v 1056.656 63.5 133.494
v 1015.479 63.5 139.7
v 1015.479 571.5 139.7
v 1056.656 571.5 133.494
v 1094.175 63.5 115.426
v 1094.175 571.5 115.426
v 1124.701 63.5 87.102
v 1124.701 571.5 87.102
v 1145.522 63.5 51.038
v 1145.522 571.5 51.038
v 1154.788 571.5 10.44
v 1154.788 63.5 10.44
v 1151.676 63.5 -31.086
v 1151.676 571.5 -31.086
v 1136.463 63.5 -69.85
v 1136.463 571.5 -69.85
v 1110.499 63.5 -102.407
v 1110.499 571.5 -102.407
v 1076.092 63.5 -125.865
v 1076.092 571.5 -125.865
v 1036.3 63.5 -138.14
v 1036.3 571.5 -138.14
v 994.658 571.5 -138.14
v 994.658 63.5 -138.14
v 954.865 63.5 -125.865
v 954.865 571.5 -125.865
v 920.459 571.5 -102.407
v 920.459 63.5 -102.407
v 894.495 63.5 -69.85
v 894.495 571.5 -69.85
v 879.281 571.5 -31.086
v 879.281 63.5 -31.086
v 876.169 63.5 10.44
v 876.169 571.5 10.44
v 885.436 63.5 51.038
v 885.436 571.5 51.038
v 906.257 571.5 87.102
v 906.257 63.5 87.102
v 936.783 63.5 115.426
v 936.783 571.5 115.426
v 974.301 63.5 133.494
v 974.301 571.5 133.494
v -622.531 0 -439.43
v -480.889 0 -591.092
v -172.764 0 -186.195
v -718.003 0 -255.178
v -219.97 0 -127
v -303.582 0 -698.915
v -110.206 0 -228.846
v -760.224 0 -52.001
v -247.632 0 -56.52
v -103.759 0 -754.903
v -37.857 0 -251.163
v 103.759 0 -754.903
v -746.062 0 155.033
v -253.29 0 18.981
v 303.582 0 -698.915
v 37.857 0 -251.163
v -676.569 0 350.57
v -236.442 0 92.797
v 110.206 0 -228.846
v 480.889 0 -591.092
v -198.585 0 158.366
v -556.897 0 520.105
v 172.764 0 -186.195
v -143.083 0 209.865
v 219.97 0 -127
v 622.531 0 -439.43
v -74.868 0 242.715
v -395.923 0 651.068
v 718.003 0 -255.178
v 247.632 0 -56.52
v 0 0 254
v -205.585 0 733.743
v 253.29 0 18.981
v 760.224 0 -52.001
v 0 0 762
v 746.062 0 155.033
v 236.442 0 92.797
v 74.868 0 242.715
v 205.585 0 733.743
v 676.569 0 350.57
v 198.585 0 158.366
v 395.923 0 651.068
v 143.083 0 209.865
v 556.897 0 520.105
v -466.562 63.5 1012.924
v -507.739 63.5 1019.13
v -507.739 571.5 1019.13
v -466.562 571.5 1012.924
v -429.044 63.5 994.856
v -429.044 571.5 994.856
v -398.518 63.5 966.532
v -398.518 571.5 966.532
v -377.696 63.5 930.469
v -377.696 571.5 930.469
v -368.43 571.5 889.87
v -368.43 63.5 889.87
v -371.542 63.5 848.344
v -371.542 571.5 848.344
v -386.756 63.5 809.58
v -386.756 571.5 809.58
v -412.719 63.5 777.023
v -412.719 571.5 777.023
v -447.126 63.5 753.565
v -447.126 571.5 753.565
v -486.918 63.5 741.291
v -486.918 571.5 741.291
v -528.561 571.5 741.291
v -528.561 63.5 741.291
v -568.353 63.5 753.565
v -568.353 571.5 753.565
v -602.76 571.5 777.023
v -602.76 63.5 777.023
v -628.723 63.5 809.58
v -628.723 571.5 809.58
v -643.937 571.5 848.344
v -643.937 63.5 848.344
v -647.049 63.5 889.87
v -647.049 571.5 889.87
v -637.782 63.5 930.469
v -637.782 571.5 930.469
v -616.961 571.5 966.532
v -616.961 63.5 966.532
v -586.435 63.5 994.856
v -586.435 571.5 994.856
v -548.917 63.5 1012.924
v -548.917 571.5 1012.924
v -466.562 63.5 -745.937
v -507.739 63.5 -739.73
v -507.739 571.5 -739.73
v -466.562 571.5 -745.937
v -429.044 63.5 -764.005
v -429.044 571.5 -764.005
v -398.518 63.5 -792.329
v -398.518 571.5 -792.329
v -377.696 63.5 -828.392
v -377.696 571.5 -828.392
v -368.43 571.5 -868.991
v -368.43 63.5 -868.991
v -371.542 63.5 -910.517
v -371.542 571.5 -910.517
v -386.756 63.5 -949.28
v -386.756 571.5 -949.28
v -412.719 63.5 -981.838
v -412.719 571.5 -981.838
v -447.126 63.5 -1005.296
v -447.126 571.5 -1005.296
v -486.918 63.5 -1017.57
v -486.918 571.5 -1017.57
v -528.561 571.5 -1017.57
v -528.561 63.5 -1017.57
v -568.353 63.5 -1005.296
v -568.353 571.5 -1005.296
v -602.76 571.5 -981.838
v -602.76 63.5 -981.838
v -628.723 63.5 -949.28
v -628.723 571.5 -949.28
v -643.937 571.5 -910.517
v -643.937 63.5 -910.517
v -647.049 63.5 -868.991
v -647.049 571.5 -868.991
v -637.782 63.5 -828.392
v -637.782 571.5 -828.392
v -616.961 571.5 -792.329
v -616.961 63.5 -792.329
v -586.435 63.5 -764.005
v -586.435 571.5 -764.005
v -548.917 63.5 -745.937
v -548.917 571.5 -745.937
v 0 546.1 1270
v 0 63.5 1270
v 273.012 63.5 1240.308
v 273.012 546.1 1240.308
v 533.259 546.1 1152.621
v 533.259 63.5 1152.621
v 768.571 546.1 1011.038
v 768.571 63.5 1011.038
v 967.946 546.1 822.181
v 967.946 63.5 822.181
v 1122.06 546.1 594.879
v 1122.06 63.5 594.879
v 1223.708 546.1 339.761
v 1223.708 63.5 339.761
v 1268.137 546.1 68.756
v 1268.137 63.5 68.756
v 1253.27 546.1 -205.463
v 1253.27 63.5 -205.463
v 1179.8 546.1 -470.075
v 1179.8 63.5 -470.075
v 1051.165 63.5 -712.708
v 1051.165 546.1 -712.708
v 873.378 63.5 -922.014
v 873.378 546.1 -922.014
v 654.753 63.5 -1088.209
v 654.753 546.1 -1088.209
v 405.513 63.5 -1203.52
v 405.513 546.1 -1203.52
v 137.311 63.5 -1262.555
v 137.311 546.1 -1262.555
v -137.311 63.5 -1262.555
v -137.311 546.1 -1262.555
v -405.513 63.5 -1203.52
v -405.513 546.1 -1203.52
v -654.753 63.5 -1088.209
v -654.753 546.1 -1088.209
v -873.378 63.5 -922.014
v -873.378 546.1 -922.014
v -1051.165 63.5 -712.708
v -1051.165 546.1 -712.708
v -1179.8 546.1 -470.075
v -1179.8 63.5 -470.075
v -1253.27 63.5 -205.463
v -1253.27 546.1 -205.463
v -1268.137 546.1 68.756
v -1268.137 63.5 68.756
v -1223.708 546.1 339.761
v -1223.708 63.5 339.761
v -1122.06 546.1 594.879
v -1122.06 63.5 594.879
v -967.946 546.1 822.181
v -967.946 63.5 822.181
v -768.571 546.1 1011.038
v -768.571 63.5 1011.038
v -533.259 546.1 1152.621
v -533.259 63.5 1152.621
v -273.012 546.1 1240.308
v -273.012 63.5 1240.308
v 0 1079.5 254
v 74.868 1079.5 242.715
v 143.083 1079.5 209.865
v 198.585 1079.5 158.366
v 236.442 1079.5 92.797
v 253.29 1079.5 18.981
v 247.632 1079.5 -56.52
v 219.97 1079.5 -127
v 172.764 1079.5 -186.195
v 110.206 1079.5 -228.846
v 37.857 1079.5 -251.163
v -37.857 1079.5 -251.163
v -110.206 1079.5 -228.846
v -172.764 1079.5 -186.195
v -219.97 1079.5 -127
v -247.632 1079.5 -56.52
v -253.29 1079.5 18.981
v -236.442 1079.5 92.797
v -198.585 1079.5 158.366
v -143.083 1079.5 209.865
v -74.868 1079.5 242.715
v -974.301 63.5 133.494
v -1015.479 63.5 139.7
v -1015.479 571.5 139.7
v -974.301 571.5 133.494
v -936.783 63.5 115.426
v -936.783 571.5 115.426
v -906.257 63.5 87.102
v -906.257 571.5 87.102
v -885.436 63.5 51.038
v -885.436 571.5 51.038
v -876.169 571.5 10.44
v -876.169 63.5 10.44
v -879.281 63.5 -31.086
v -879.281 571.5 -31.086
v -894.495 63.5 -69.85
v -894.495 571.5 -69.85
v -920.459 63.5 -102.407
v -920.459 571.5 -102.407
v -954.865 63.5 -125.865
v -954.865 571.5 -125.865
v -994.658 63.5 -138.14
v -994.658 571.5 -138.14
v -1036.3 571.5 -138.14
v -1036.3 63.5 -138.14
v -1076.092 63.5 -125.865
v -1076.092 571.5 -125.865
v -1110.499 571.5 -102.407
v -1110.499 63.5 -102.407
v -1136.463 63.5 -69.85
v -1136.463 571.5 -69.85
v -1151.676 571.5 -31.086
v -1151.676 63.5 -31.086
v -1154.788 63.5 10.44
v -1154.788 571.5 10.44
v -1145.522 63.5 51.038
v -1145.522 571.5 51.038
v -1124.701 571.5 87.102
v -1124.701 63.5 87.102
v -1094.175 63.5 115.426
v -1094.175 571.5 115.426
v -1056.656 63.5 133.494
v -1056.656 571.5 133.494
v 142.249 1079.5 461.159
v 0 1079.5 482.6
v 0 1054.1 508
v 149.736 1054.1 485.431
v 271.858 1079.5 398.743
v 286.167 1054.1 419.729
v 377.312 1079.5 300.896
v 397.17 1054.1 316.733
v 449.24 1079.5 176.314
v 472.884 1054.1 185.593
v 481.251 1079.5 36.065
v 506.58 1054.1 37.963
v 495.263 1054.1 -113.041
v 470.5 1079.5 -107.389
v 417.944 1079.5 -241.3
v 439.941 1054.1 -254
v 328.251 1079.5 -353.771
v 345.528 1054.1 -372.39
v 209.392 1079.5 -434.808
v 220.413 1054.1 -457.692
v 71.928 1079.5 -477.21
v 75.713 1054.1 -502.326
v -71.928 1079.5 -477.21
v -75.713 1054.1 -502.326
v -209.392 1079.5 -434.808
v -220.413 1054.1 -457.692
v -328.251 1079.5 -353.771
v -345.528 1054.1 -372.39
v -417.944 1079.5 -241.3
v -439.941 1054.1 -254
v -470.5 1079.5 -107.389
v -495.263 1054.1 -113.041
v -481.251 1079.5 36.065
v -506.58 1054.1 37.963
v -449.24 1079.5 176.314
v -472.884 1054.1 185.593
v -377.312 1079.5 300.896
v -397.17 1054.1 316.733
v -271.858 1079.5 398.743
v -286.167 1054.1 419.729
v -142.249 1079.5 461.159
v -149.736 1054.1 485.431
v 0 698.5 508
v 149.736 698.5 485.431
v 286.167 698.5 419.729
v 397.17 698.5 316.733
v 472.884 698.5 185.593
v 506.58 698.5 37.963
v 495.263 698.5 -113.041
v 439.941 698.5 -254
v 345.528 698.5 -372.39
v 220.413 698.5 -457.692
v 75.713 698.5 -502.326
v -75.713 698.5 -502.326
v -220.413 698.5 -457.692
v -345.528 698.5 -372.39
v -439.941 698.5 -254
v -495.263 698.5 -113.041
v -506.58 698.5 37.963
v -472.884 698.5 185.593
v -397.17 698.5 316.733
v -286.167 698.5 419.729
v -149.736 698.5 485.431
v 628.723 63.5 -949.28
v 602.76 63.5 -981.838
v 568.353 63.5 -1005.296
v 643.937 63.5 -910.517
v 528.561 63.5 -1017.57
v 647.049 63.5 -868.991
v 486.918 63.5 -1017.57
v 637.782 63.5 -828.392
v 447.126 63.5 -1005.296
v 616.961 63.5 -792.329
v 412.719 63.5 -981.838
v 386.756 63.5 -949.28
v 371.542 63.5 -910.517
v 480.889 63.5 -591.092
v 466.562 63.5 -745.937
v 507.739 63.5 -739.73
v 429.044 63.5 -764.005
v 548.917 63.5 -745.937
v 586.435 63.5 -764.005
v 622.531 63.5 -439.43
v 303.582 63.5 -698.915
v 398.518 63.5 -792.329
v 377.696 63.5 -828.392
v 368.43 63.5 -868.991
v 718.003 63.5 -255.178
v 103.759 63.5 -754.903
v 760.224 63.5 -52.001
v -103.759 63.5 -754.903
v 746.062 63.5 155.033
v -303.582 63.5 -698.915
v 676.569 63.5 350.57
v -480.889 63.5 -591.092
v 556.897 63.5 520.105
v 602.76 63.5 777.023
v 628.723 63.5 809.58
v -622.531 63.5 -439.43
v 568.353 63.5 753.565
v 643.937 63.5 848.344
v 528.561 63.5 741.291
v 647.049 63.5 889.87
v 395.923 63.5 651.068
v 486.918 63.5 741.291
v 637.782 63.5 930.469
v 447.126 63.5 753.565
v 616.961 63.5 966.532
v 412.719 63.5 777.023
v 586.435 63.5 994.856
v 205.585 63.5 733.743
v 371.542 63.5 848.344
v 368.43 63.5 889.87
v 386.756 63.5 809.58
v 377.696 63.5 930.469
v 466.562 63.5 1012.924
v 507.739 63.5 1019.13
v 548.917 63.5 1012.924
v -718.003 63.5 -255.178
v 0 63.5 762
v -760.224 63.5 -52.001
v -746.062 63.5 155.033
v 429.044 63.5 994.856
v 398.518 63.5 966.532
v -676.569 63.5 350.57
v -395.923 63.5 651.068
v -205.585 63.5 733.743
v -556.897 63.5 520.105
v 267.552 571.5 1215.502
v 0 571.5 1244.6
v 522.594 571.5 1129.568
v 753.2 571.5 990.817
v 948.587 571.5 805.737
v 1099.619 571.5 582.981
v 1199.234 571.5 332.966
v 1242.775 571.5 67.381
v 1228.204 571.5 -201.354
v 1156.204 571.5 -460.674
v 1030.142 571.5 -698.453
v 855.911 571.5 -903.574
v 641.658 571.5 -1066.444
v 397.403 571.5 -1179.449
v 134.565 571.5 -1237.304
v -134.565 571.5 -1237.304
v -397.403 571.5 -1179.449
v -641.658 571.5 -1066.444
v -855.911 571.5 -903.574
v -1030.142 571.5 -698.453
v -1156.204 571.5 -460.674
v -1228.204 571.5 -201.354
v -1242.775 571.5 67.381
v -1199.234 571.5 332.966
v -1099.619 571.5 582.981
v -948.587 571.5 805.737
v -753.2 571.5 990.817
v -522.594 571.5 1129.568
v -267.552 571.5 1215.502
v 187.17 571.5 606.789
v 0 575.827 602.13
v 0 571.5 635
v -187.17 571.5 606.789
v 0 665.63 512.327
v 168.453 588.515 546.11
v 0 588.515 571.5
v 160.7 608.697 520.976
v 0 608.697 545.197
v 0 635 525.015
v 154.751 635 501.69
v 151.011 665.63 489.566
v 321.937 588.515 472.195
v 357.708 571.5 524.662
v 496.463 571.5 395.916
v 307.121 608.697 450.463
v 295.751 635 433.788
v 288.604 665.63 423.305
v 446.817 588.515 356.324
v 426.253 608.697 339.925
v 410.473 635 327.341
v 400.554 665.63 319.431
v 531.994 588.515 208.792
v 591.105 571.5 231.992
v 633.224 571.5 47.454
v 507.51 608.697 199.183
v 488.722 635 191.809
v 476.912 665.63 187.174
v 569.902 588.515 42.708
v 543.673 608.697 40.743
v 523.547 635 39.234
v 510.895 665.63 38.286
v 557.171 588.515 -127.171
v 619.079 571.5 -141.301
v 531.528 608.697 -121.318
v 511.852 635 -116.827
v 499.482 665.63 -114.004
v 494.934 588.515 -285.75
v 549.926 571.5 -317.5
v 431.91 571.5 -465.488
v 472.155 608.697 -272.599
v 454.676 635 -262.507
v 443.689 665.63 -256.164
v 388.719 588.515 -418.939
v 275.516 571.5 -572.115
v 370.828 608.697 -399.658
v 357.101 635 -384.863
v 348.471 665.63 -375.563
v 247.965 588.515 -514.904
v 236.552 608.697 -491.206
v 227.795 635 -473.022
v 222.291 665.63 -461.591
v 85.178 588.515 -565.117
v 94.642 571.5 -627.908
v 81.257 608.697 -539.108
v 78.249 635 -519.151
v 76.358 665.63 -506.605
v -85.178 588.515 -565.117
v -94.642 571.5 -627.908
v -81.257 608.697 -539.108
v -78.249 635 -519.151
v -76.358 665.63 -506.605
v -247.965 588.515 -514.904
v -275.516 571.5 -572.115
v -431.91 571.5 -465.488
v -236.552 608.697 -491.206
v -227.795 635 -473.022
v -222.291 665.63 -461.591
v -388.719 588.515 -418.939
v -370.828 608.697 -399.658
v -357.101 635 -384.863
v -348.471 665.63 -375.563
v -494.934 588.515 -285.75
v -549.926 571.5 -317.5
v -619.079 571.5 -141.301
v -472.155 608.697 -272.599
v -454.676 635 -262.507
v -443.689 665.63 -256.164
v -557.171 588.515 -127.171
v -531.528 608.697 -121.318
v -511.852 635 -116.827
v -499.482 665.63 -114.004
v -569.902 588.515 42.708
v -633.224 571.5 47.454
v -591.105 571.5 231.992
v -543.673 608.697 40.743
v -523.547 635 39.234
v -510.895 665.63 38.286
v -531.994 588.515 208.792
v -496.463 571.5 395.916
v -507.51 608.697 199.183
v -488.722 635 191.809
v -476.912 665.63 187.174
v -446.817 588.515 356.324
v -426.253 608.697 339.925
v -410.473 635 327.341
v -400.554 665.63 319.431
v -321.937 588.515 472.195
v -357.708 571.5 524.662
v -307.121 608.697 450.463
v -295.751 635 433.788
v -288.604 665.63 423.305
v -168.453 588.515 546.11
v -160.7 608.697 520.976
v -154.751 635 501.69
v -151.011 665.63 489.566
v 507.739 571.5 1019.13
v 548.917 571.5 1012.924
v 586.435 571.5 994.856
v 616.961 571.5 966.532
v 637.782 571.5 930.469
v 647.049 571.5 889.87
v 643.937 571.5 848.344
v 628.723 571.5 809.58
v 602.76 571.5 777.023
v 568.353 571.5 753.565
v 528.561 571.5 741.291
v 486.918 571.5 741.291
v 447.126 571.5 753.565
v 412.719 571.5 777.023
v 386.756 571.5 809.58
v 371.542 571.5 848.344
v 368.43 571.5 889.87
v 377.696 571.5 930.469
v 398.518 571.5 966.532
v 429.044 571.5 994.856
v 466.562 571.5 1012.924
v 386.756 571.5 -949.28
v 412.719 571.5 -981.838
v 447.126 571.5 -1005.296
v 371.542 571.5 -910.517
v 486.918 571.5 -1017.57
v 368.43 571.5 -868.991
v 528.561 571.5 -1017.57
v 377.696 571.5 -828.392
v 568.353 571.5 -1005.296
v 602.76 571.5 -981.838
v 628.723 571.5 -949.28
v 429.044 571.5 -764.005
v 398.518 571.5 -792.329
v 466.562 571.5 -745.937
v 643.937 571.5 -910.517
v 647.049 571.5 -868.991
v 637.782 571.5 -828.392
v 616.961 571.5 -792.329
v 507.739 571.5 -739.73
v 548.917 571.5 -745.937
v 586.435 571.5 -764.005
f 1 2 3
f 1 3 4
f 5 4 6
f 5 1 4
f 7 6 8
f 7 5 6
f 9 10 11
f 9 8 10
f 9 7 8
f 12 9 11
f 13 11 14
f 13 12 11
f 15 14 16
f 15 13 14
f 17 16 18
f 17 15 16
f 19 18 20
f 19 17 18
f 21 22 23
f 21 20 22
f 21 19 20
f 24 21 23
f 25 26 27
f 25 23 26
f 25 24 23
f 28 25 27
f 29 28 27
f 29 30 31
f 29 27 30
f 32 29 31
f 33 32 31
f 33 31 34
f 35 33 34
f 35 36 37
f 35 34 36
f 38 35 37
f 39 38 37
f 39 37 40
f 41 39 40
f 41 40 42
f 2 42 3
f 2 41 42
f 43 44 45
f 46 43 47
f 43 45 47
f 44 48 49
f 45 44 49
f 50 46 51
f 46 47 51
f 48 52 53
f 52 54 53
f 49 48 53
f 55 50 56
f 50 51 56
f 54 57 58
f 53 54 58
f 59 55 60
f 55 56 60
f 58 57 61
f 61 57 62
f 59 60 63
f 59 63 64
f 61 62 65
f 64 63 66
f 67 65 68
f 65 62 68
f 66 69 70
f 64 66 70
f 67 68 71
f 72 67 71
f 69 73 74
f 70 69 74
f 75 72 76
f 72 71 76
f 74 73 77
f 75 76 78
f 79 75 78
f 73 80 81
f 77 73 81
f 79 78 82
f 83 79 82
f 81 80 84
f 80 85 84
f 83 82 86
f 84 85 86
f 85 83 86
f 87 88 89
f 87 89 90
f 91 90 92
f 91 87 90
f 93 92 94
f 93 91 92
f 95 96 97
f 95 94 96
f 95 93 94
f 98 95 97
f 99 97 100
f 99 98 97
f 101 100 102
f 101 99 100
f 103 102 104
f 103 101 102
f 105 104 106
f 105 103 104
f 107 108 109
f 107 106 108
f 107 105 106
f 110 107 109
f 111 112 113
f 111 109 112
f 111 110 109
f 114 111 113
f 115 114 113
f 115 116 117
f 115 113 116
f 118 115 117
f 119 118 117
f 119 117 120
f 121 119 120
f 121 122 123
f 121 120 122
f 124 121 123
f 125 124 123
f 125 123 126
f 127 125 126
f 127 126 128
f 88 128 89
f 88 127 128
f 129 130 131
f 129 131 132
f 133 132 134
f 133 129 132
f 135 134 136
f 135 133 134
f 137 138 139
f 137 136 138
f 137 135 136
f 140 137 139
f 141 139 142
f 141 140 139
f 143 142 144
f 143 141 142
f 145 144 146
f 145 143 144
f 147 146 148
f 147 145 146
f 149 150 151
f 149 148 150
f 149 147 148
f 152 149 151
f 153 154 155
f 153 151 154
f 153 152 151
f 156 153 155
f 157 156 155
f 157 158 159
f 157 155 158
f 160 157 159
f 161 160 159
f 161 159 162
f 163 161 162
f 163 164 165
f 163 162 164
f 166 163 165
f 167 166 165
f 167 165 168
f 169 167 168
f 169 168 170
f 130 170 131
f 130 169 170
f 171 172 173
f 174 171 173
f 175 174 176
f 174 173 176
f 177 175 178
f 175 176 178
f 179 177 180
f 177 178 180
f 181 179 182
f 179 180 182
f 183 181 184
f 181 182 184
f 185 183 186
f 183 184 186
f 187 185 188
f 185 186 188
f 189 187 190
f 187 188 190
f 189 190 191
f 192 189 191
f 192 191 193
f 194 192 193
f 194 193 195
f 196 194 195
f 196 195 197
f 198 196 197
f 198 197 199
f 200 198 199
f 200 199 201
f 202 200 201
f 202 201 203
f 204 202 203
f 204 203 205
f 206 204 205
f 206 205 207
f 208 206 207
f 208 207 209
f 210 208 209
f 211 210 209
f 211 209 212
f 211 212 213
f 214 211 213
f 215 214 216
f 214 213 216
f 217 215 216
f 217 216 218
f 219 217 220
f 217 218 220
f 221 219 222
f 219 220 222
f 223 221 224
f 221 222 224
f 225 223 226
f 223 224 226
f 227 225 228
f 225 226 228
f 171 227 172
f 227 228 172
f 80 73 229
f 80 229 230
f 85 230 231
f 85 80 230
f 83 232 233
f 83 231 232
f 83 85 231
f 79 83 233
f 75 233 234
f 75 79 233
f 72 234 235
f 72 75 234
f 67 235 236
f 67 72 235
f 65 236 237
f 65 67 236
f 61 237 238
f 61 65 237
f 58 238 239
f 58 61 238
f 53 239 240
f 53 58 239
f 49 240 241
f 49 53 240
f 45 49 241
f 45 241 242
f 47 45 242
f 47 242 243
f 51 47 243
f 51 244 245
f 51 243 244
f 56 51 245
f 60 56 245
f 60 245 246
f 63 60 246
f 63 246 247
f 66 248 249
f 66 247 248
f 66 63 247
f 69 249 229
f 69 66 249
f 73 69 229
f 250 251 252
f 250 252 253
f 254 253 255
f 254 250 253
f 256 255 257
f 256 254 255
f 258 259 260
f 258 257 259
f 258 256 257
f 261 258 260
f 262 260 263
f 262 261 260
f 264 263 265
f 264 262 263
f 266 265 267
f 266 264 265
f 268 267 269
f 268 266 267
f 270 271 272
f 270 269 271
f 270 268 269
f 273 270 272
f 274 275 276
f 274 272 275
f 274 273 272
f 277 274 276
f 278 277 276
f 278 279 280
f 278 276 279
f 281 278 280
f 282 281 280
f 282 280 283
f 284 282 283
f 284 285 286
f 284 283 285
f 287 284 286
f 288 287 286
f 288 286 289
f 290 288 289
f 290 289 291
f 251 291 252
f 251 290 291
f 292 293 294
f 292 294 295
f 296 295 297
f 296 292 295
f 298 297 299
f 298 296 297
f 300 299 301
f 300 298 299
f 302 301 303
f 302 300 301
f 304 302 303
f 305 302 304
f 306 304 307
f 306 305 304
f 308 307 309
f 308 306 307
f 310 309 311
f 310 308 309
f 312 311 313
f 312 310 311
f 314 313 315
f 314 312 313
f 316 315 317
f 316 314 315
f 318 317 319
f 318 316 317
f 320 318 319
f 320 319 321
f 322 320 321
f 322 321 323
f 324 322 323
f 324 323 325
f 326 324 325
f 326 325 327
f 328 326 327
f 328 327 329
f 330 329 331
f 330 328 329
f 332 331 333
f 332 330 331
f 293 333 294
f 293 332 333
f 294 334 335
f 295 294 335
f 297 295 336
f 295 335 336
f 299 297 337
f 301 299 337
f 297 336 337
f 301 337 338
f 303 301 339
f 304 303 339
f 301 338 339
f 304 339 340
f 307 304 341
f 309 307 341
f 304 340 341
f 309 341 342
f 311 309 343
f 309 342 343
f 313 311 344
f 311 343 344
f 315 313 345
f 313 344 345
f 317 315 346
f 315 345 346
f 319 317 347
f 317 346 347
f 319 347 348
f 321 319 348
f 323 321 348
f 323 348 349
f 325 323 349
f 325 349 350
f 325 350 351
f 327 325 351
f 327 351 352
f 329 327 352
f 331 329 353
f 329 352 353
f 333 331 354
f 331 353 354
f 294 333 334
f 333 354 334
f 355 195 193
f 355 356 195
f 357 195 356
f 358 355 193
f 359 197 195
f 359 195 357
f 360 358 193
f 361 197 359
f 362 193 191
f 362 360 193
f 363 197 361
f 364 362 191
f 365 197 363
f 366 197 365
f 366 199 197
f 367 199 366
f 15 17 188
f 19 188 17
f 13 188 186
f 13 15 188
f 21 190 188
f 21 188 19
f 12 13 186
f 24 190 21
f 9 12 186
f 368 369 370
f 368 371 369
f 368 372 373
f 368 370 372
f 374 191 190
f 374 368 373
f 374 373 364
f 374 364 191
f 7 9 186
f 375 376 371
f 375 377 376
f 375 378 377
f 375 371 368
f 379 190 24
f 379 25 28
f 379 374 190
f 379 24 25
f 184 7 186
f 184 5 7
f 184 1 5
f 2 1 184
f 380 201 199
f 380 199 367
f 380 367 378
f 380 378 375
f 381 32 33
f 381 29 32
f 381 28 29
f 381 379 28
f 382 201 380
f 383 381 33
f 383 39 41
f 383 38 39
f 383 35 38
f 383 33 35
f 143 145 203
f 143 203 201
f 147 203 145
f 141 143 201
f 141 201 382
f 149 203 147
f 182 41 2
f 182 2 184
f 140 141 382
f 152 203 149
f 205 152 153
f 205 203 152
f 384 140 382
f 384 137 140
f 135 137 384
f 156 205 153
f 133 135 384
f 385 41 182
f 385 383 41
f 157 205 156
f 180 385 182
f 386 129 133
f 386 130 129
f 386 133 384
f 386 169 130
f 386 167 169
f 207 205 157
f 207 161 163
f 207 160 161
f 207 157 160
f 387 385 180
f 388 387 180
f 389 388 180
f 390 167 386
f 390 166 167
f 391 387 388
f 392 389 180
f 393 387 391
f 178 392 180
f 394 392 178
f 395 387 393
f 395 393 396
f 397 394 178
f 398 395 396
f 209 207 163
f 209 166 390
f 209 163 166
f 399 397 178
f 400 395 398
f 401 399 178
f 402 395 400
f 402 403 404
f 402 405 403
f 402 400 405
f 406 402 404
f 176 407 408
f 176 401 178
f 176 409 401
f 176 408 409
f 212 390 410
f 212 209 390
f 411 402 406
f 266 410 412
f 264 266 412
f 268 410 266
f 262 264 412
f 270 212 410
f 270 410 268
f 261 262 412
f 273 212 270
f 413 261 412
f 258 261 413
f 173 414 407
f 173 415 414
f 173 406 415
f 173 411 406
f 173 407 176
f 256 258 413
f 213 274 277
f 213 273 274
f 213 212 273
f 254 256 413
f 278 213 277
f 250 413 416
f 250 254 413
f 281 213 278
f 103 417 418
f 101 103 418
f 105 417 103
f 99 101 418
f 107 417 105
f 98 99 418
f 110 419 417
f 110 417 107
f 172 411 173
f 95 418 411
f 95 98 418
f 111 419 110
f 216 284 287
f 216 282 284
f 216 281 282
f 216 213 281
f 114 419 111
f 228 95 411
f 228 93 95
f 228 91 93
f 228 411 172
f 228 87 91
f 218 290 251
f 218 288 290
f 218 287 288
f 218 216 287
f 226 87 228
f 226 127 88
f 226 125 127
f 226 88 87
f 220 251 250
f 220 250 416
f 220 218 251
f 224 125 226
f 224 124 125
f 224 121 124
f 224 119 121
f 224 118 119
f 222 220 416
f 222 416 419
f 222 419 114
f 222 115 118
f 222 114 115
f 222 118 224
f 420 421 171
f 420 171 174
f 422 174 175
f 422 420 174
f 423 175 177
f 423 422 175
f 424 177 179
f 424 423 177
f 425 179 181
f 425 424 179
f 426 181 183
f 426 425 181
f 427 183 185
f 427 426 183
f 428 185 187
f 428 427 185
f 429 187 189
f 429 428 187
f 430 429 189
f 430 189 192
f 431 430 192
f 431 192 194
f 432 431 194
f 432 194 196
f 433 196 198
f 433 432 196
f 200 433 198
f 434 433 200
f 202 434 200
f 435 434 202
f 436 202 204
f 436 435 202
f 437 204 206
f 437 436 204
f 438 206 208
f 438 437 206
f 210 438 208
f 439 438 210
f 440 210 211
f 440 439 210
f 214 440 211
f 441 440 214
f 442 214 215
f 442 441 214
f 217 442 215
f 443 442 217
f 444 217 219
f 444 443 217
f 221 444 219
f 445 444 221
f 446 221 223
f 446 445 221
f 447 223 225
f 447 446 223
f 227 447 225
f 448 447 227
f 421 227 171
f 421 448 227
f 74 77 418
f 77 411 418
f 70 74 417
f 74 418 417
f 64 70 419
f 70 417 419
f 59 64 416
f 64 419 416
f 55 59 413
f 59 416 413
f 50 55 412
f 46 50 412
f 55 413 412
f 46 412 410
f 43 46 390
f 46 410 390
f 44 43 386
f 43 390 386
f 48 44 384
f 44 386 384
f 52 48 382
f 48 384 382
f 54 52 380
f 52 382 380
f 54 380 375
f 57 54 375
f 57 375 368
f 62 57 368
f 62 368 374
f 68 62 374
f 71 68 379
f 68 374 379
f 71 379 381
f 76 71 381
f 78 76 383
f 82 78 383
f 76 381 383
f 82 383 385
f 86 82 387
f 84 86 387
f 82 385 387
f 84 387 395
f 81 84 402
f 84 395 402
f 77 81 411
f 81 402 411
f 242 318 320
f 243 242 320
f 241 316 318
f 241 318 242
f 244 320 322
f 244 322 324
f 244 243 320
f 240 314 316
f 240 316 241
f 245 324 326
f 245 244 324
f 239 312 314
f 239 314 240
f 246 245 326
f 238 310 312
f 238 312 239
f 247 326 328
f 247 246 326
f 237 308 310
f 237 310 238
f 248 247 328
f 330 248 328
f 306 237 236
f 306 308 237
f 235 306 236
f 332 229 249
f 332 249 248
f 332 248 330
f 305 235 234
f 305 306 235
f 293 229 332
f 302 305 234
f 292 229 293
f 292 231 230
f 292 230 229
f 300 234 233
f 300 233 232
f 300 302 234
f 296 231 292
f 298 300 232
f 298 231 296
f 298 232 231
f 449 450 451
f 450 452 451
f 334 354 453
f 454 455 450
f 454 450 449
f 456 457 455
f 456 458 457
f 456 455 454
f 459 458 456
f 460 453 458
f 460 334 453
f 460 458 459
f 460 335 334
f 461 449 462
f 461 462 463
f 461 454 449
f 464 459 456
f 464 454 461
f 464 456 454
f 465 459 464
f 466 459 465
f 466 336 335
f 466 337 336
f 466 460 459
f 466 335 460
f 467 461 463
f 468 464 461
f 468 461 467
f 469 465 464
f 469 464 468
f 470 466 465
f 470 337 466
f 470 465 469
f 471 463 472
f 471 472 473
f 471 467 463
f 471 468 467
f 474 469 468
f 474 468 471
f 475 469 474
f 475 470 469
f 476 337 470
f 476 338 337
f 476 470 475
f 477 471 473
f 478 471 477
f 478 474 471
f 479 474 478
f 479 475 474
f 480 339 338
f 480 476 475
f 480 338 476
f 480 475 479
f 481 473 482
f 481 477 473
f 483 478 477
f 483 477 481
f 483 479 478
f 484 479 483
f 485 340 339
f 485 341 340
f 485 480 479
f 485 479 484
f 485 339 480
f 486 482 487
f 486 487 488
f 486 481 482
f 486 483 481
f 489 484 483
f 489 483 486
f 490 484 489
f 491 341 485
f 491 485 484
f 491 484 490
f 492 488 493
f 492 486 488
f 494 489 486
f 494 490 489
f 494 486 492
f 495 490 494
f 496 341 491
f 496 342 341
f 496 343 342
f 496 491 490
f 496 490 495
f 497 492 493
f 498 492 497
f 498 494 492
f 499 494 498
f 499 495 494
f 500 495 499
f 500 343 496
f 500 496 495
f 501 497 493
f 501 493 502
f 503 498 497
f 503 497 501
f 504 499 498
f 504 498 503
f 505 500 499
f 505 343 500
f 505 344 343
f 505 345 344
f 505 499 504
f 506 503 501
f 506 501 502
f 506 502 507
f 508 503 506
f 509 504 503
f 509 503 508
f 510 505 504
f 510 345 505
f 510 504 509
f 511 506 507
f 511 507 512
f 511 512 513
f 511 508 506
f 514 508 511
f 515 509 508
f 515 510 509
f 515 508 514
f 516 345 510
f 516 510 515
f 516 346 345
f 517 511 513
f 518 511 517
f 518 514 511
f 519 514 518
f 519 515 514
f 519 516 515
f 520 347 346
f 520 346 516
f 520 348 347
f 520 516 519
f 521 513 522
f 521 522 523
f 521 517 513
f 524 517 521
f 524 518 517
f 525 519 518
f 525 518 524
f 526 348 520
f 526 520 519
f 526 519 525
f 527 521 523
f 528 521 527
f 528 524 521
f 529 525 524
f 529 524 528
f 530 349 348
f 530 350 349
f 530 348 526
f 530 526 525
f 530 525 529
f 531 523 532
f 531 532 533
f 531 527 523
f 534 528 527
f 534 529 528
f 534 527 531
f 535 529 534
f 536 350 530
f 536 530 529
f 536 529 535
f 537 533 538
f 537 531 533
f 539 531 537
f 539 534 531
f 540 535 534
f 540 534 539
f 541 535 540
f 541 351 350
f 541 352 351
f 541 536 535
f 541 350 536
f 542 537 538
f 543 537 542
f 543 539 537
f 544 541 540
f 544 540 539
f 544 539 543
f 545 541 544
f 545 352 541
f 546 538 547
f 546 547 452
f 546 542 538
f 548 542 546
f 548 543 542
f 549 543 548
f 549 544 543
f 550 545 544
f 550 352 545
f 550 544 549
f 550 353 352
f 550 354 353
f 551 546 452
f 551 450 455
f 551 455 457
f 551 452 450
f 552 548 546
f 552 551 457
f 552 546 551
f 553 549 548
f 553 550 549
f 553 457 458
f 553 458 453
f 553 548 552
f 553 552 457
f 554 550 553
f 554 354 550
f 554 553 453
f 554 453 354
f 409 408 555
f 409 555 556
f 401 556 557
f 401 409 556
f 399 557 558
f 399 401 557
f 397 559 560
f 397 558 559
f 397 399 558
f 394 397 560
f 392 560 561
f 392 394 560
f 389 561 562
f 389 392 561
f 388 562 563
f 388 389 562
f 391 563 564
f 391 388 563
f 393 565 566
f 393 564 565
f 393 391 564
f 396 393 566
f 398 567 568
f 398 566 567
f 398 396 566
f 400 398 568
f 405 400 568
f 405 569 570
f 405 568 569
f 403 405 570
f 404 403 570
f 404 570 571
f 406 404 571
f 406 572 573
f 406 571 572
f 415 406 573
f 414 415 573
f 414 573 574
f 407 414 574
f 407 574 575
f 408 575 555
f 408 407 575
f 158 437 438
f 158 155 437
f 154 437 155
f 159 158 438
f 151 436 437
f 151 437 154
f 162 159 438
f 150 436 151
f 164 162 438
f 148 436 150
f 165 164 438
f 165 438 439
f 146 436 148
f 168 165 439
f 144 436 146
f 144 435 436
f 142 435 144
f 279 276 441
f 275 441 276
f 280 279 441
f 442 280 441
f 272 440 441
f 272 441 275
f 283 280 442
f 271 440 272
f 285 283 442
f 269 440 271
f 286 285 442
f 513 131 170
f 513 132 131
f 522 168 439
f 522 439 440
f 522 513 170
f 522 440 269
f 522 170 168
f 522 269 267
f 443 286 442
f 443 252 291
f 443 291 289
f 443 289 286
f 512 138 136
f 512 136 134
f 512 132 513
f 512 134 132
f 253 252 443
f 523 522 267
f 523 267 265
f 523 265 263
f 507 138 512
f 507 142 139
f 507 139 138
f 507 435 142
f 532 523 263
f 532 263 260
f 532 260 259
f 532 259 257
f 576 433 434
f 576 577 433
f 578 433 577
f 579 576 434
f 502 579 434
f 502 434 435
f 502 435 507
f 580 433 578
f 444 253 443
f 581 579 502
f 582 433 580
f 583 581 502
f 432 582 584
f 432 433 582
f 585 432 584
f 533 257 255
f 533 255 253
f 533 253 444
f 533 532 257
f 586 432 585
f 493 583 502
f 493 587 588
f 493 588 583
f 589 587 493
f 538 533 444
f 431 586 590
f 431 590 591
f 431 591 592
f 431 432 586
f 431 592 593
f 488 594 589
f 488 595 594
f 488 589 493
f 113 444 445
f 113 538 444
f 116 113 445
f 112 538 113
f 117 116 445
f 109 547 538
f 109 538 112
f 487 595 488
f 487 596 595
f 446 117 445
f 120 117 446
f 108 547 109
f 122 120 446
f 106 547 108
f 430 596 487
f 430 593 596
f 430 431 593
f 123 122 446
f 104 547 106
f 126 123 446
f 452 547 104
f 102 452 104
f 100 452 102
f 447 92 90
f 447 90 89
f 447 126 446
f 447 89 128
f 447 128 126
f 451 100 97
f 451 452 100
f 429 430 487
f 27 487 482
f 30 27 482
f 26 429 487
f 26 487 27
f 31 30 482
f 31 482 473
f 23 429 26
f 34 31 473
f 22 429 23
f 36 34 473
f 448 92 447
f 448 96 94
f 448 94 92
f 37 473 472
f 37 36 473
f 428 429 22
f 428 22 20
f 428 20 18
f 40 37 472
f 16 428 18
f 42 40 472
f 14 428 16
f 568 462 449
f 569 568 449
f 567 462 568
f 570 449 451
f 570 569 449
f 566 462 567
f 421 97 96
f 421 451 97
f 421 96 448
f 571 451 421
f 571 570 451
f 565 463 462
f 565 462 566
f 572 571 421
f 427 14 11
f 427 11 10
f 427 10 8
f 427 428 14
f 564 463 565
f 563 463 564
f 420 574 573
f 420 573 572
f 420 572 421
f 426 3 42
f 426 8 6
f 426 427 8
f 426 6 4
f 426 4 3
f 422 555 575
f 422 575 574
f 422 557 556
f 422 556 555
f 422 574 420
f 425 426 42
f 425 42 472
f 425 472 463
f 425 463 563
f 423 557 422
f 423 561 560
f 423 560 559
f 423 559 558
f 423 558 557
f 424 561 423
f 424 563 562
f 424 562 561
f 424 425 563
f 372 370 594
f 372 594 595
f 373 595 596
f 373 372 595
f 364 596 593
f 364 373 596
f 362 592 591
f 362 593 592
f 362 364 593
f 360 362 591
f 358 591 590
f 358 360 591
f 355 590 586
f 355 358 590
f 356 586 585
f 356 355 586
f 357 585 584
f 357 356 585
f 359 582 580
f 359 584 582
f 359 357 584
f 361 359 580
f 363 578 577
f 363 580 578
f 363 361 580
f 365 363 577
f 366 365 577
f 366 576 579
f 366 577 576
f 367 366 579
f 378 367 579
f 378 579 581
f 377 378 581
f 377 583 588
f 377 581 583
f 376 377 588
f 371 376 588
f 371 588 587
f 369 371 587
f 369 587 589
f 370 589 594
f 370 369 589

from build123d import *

# Parameters (mm, degrees)
SKETCH_2_R               = 1270
EXTRUDE_1_DEPTH          = 571.5
SKETCH_3_W               = 508
SKETCH_3_H               = 63.5
CHAMFER_2_SIZE           = 25.4
SKETCH_4_R               = 139.7
CUT_EXTRUDE_1_DEPTH      = 1016
EXTRUDE_START            = -2.54
SKETCH_5_R               = 508
EXTRUDE_2_DEPTH          = 508
FILLET_10_R              = 127
CHAMFER_3_SIZE           = 25.4
CUT_EXTRUDE_2_DEPTH      = 1886.556130589
CUT_EXTRUDE_2_DEPTH_BACK = 1886.556130589
SKETCH_6_R               = 254


with BuildPart() as part:
    # 草图2 → 凸台-拉伸1 (new body)
    with BuildSketch(Plane(origin=(0, 0, 0), x_dir=(1, 0, 0), z_dir=(0, 1, 0))):
        with Locations(Location((0, 0, 0), (0, 0, 270))):
            Circle(SKETCH_2_R)
    extrude(amount=EXTRUDE_1_DEPTH)

    # 草图3 → 切除-旋转1 (revolve, cut)
    with BuildSketch(Plane.XY, mode=Mode.PRIVATE) as cut_revolve_1_sk:
        with Locations((-1016, 31.75)):
            Rectangle(SKETCH_3_W, SKETCH_3_H)
    revolve(cut_revolve_1_sk.sketch.rotate(Axis((0, 0, 0), (0, -1, 0)), 270), axis=Axis((0, 0, 0), (0, -1, 0)), mode=Mode.SUBTRACT)

    # 倒角2
    chamfer_2_edges = [part.edges().sort_by_distance(p)[0] for p in [
        (0, 571.5, -1270),
    ]]
    chamfer(chamfer_2_edges, length=CHAMFER_2_SIZE)

    # 草图4 → 切除-拉伸1 (cut)
    with BuildSketch(Plane(origin=(0, 0, 0), x_dir=(1, 0, 0), z_dir=(0, 1, 0))):
        with Locations(Location((-507.739397927, 879.430434215, 0), (0, 0, 270))):
            Circle(SKETCH_4_R)
        with Locations(Location((507.739397927, 879.430434215, 0), (0, 0, 270))):
            Circle(SKETCH_4_R)
        with Locations(Location((1015.478795855, 0, 0), (0, 0, 270))):
            Circle(SKETCH_4_R)
        with Locations(Location((507.739397928, -879.430434215, 0), (0, 0, 270))):
            Circle(SKETCH_4_R)
        with Locations(Location((-507.739397927, -879.430434215, 0), (0, 0, 270))):
            Circle(SKETCH_4_R)
        with Locations(Location((-1015.478795855, 0, 0), (0, 0, 270))):
            Circle(SKETCH_4_R)
    extrude(amount=CUT_EXTRUDE_1_DEPTH, mode=Mode.SUBTRACT)

    # 草图5 → 凸台-拉伸2 (add)
    with BuildSketch(Plane(origin=(0, 574.04, 0), x_dir=(1, 0, 0), z_dir=(0, 1, 0)).offset(EXTRUDE_START)):
        with Locations(Location((0, 0, 0), (0, 0, 270))):
            Circle(SKETCH_5_R)
    extrude(amount=EXTRUDE_2_DEPTH)

    # 圆角10
    fillet_10_edges = [part.edges().sort_by_distance(p)[0] for p in [
        (0, 571.5, -508),
    ]]
    fillet(fillet_10_edges, radius=FILLET_10_R)

    # 倒角3
    chamfer_3_edges = [part.edges().sort_by_distance(p)[0] for p in [
        (0, 1079.5, -508),
    ]]
    chamfer(chamfer_3_edges, length=CHAMFER_3_SIZE)

    # 草图6 → 切除-拉伸2 (cut, two sides: drawn at the far end of the back side and taken through both)
    with BuildSketch(Plane(origin=(0, 574.04, 0), x_dir=(1, 0, 0), z_dir=(0, 1, 0)).offset(-CUT_EXTRUDE_2_DEPTH_BACK)):
        with Locations(Location((0, 0, 0), (0, 0, 270))):
            Circle(SKETCH_6_R)
    extrude(amount=CUT_EXTRUDE_2_DEPTH + CUT_EXTRUDE_2_DEPTH_BACK, mode=Mode.SUBTRACT)


solid = part.part
